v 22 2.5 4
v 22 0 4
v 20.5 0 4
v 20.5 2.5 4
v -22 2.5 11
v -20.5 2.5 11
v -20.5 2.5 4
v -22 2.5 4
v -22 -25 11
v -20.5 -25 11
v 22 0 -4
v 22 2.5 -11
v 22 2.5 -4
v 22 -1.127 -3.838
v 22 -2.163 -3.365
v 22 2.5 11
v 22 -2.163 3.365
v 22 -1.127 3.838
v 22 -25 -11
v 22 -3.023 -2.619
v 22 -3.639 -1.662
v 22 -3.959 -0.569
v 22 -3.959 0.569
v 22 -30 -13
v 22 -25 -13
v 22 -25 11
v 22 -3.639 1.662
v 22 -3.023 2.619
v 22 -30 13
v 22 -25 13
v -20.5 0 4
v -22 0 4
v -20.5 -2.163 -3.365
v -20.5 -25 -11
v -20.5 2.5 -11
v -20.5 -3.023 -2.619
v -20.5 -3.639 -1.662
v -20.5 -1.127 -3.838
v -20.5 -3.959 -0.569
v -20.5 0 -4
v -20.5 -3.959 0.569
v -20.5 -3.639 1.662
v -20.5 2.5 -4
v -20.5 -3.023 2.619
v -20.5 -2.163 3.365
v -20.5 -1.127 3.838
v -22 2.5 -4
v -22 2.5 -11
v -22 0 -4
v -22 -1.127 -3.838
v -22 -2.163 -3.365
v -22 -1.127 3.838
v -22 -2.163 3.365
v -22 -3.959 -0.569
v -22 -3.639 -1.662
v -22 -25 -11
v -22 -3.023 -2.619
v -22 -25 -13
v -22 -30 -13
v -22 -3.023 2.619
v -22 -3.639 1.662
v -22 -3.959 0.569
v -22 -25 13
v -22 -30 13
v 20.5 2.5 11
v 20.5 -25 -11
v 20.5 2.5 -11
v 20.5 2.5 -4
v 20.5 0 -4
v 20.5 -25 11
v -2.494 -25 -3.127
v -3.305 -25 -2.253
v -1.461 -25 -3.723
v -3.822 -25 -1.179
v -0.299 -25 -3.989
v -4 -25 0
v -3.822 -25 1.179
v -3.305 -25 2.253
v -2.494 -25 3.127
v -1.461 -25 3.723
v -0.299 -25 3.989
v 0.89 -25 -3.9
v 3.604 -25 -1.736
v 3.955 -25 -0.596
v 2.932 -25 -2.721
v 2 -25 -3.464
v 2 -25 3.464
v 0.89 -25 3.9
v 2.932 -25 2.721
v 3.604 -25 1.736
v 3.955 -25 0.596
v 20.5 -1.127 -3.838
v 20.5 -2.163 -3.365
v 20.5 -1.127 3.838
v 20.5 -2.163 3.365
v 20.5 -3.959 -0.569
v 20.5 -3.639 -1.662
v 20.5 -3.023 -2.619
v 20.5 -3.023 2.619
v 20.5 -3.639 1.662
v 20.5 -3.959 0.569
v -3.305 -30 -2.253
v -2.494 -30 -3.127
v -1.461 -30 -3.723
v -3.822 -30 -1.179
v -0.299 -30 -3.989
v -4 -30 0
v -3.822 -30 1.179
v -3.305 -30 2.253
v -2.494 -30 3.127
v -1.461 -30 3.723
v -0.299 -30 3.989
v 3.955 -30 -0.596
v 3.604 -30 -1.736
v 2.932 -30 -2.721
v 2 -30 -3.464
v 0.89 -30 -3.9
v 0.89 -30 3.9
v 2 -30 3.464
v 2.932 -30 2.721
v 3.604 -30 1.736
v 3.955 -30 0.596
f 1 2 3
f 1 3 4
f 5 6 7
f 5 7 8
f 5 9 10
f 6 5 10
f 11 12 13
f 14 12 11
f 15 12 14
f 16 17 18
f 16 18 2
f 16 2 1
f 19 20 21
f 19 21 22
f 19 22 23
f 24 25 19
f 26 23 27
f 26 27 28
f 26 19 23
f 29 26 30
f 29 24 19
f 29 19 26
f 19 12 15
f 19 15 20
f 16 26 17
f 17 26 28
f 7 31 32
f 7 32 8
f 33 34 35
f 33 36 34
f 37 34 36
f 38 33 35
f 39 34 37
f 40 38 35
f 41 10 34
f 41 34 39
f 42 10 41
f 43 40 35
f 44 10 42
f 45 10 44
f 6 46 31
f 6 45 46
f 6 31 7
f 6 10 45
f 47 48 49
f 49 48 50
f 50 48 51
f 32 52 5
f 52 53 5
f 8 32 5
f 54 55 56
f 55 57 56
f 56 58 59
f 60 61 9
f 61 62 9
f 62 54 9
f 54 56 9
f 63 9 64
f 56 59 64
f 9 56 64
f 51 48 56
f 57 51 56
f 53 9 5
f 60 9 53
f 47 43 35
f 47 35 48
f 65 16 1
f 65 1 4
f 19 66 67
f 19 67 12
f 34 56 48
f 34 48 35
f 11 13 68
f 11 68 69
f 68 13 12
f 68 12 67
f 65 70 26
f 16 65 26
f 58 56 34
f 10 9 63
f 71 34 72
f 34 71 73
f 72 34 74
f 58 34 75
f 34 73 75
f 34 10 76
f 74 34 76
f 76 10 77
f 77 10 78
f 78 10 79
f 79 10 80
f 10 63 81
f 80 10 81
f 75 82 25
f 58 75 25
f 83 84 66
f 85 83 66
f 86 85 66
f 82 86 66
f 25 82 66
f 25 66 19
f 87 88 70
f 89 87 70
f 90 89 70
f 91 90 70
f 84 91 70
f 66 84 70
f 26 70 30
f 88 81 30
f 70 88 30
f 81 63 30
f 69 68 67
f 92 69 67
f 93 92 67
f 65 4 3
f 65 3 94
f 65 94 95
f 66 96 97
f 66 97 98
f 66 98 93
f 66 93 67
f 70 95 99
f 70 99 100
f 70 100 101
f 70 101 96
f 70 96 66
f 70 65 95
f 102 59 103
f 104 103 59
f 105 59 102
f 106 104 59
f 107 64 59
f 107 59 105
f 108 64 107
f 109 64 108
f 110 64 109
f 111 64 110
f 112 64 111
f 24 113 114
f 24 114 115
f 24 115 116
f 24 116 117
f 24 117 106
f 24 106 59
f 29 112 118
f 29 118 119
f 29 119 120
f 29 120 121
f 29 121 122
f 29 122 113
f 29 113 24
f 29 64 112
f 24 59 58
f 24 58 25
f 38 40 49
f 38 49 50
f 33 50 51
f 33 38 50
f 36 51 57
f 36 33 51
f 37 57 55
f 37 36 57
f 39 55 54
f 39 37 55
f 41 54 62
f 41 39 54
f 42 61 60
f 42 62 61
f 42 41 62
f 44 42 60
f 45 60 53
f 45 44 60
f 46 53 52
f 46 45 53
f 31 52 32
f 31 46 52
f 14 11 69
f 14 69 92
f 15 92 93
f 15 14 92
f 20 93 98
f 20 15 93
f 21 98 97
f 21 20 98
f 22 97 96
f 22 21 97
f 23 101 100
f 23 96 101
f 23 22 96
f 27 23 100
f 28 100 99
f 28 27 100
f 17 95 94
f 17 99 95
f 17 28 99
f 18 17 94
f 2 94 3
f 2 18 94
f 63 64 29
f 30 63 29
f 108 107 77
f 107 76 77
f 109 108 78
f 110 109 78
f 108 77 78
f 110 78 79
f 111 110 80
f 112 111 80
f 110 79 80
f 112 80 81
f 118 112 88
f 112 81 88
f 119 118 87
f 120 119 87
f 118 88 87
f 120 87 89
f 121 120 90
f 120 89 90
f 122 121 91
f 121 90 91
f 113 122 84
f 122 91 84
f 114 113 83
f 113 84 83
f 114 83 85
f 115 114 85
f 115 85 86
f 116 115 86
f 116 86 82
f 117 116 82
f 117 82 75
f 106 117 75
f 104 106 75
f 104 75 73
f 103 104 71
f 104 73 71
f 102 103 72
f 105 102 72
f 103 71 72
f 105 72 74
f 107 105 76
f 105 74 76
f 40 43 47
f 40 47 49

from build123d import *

# Parameters (mm, degrees)
BOSS_EXTRUDE1_DEPTH = 11
BOSS_EXTRUDE2_DEPTH = 19.5
SKETCH3_R           = 4
CUT_EXTRUDE1_DEPTH  = 2.5
CUT_EXTRUDE2_DEPTH  = 45
SKETCH5_W           = 44
SKETCH5_H           = 26
BOSS_EXTRUDE3_DEPTH = 5
SKETCH3_3_R         = 4
CUT_EXTRUDE3_DEPTH  = 5


with BuildPart() as part:
    # Sketch1 → Boss-Extrude1 (new body, symmetric)
    with BuildSketch(Plane.XY):
        Polygon((-22, 2.5), (-22, -30), (22, -30), (22, 2.5), (20.5, 2.5), (20.5, -28.5), (-20.5, -28.5), (-20.5, 2.5), align=None)
    extrude(amount=BOSS_EXTRUDE1_DEPTH, both=True)

    # Sketch2 → Boss-Extrude2 (add, symmetric)
    with BuildSketch(Plane(origin=(0, 0, 0), x_dir=(0, 0, -1), z_dir=(1, 0, 0))):
        Polygon((-11, -30), (-13, -30), (-13, -25), (-11.5, -25), (-11.5, -28.5), (-11, -28.5), align=None)
    boss_extrude2 = extrude(amount=BOSS_EXTRUDE2_DEPTH, both=True)

    # Mirror1: Boss-Extrude2 across plane
    add(boss_extrude2.mirror(Plane.XY))

    # Sketch3 → Cut-Extrude1 (cut, through all)
    with BuildSketch(Plane(origin=(0, -28.5, 0), x_dir=(-1, 0, 0), z_dir=(0, 1, 0))):
        Circle(SKETCH3_R)
    extrude(amount=-CUT_EXTRUDE1_DEPTH, mode=Mode.SUBTRACT)

    # Sketch4 → Cut-Extrude2 (cut, through all)
    with BuildSketch(Plane(origin=(22, 0, 0), x_dir=(0, 0, -1), z_dir=(1, 0, 0))):
        with BuildLine():
            Line((-4, 0), (-4, 2.5))
            Line((-4, 2.5), (4, 2.5))
            Line((4, 2.5), (4, 0))
            ThreePointArc((4, 0), (0, -4), (-4, 0))
        make_face()
    extrude(amount=-CUT_EXTRUDE2_DEPTH, mode=Mode.SUBTRACT)

    # Sketch5 → Boss-Extrude3 (add)
    with BuildSketch(Plane.XZ.offset(30)):
        Rectangle(SKETCH5_W, SKETCH5_H)
    extrude(amount=-BOSS_EXTRUDE3_DEPTH)

    # Sketch3<3> → Cut-Extrude3 (cut, symmetric)
    with BuildSketch(Plane(origin=(0, -28.5, 0), x_dir=(-1, 0, 0), z_dir=(0, 1, 0))):
        Circle(SKETCH3_3_R)
    extrude(amount=CUT_EXTRUDE3_DEPTH, both=True, mode=Mode.SUBTRACT)


solid = part.part
